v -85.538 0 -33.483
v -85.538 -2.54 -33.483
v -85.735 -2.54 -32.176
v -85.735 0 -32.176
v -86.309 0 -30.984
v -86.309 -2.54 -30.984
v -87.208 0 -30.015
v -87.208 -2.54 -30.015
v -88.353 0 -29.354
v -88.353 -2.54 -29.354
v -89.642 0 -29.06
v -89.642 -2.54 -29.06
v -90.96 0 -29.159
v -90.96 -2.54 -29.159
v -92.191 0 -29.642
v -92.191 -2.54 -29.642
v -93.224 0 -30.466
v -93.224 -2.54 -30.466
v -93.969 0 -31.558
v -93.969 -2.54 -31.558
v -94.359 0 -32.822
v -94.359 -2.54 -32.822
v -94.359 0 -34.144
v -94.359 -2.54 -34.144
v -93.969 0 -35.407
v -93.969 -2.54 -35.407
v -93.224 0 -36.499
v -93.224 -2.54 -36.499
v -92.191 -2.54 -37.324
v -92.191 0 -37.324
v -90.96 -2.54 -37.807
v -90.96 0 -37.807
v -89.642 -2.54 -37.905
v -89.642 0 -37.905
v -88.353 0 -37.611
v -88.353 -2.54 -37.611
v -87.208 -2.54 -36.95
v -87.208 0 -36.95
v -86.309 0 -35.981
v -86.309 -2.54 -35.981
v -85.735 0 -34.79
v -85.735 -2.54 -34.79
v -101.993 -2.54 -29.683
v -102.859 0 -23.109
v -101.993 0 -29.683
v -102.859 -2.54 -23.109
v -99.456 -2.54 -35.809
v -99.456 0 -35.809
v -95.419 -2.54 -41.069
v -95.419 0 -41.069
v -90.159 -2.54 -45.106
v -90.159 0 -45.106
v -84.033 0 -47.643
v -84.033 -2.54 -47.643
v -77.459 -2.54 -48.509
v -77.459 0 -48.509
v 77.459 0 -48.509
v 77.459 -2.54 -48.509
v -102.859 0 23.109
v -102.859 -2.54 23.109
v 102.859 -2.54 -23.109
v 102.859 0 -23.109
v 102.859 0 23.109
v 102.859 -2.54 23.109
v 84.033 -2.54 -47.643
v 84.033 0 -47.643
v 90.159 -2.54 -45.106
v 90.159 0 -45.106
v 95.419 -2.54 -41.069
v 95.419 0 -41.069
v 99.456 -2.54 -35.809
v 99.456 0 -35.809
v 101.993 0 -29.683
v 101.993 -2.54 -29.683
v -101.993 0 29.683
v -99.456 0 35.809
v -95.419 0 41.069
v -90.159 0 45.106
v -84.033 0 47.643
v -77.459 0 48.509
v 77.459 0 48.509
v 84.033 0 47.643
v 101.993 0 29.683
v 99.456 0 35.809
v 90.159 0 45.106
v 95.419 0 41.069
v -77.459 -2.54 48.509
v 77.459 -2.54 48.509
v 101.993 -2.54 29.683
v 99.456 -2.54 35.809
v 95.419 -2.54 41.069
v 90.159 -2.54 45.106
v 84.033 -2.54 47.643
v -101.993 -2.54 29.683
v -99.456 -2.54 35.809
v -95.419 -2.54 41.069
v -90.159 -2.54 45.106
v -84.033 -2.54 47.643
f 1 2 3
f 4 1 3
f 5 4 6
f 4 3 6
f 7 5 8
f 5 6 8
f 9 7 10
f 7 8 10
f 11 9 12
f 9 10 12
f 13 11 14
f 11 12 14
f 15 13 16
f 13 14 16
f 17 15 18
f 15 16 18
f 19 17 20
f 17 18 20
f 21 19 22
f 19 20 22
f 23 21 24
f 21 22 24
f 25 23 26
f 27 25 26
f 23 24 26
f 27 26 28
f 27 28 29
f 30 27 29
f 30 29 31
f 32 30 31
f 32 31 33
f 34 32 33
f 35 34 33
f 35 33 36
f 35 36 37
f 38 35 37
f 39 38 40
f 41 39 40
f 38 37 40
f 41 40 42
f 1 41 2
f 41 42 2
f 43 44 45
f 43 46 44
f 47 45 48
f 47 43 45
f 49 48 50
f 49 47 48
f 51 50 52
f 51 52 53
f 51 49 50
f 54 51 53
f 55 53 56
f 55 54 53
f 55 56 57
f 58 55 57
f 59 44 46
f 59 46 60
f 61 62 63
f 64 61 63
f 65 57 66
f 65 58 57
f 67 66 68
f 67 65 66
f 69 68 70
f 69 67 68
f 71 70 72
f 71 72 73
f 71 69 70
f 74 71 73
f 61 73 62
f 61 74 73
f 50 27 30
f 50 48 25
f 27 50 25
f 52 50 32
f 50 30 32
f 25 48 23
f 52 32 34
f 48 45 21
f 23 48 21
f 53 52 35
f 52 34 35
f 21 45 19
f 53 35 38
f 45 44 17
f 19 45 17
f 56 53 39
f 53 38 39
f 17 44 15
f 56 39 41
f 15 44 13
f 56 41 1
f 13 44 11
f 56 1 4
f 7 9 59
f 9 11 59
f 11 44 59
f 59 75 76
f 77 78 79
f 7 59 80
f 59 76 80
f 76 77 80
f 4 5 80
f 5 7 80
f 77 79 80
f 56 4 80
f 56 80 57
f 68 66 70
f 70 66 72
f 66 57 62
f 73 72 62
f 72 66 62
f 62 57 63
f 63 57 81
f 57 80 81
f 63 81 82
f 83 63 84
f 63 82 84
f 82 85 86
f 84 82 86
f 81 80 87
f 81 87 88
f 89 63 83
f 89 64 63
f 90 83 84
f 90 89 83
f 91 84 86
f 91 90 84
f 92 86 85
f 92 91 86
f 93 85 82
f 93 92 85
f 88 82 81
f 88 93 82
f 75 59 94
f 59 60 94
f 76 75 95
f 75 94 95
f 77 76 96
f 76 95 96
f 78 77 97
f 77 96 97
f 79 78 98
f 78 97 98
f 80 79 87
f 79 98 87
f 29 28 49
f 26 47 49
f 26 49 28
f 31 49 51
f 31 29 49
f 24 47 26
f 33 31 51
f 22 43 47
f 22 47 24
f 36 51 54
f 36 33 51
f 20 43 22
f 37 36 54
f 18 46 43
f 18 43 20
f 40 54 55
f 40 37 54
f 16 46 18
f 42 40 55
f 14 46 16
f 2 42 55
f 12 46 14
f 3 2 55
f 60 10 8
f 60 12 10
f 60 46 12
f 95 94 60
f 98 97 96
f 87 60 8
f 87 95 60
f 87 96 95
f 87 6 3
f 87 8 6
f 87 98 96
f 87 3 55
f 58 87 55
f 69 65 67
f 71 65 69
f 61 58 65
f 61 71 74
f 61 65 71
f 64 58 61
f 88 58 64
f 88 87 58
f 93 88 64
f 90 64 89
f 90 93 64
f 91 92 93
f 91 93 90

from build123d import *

# Parameters (mm, degrees)
F0_W     = 205.717654
F0_H     = 97.017468
F1_DEPTH = 2.54
F2_R     = 25.4
F3_R     = 4.435066
F4_DEPTH = 2.54


with BuildPart() as f1:
    # F0 (on Front) → F1 (new body)
    with BuildSketch(Plane.XZ):
        Rectangle(F0_W, F0_H)
    extrude(amount=F1_DEPTH)

    # F2
    f2_edges = [f1.edges().sort_by_distance(p)[0] for p in [
        (102.858827, -1.27, 48.508734),
        (102.858827, -1.27, -48.508734),
        (-102.858827, -1.27, -48.508734),
        (-102.858827, -1.27, 48.508734),
    ]]
    fillet(f2_edges, radius=F2_R)

    # F3 (on face) → F4 (cut)
    with BuildSketch(Plane.XZ.offset(2.54)):
        with Locations((-89.973114, -33.48276)):
            Circle(F3_R)
    extrude(amount=-F4_DEPTH, mode=Mode.SUBTRACT)


solid = f1.part
